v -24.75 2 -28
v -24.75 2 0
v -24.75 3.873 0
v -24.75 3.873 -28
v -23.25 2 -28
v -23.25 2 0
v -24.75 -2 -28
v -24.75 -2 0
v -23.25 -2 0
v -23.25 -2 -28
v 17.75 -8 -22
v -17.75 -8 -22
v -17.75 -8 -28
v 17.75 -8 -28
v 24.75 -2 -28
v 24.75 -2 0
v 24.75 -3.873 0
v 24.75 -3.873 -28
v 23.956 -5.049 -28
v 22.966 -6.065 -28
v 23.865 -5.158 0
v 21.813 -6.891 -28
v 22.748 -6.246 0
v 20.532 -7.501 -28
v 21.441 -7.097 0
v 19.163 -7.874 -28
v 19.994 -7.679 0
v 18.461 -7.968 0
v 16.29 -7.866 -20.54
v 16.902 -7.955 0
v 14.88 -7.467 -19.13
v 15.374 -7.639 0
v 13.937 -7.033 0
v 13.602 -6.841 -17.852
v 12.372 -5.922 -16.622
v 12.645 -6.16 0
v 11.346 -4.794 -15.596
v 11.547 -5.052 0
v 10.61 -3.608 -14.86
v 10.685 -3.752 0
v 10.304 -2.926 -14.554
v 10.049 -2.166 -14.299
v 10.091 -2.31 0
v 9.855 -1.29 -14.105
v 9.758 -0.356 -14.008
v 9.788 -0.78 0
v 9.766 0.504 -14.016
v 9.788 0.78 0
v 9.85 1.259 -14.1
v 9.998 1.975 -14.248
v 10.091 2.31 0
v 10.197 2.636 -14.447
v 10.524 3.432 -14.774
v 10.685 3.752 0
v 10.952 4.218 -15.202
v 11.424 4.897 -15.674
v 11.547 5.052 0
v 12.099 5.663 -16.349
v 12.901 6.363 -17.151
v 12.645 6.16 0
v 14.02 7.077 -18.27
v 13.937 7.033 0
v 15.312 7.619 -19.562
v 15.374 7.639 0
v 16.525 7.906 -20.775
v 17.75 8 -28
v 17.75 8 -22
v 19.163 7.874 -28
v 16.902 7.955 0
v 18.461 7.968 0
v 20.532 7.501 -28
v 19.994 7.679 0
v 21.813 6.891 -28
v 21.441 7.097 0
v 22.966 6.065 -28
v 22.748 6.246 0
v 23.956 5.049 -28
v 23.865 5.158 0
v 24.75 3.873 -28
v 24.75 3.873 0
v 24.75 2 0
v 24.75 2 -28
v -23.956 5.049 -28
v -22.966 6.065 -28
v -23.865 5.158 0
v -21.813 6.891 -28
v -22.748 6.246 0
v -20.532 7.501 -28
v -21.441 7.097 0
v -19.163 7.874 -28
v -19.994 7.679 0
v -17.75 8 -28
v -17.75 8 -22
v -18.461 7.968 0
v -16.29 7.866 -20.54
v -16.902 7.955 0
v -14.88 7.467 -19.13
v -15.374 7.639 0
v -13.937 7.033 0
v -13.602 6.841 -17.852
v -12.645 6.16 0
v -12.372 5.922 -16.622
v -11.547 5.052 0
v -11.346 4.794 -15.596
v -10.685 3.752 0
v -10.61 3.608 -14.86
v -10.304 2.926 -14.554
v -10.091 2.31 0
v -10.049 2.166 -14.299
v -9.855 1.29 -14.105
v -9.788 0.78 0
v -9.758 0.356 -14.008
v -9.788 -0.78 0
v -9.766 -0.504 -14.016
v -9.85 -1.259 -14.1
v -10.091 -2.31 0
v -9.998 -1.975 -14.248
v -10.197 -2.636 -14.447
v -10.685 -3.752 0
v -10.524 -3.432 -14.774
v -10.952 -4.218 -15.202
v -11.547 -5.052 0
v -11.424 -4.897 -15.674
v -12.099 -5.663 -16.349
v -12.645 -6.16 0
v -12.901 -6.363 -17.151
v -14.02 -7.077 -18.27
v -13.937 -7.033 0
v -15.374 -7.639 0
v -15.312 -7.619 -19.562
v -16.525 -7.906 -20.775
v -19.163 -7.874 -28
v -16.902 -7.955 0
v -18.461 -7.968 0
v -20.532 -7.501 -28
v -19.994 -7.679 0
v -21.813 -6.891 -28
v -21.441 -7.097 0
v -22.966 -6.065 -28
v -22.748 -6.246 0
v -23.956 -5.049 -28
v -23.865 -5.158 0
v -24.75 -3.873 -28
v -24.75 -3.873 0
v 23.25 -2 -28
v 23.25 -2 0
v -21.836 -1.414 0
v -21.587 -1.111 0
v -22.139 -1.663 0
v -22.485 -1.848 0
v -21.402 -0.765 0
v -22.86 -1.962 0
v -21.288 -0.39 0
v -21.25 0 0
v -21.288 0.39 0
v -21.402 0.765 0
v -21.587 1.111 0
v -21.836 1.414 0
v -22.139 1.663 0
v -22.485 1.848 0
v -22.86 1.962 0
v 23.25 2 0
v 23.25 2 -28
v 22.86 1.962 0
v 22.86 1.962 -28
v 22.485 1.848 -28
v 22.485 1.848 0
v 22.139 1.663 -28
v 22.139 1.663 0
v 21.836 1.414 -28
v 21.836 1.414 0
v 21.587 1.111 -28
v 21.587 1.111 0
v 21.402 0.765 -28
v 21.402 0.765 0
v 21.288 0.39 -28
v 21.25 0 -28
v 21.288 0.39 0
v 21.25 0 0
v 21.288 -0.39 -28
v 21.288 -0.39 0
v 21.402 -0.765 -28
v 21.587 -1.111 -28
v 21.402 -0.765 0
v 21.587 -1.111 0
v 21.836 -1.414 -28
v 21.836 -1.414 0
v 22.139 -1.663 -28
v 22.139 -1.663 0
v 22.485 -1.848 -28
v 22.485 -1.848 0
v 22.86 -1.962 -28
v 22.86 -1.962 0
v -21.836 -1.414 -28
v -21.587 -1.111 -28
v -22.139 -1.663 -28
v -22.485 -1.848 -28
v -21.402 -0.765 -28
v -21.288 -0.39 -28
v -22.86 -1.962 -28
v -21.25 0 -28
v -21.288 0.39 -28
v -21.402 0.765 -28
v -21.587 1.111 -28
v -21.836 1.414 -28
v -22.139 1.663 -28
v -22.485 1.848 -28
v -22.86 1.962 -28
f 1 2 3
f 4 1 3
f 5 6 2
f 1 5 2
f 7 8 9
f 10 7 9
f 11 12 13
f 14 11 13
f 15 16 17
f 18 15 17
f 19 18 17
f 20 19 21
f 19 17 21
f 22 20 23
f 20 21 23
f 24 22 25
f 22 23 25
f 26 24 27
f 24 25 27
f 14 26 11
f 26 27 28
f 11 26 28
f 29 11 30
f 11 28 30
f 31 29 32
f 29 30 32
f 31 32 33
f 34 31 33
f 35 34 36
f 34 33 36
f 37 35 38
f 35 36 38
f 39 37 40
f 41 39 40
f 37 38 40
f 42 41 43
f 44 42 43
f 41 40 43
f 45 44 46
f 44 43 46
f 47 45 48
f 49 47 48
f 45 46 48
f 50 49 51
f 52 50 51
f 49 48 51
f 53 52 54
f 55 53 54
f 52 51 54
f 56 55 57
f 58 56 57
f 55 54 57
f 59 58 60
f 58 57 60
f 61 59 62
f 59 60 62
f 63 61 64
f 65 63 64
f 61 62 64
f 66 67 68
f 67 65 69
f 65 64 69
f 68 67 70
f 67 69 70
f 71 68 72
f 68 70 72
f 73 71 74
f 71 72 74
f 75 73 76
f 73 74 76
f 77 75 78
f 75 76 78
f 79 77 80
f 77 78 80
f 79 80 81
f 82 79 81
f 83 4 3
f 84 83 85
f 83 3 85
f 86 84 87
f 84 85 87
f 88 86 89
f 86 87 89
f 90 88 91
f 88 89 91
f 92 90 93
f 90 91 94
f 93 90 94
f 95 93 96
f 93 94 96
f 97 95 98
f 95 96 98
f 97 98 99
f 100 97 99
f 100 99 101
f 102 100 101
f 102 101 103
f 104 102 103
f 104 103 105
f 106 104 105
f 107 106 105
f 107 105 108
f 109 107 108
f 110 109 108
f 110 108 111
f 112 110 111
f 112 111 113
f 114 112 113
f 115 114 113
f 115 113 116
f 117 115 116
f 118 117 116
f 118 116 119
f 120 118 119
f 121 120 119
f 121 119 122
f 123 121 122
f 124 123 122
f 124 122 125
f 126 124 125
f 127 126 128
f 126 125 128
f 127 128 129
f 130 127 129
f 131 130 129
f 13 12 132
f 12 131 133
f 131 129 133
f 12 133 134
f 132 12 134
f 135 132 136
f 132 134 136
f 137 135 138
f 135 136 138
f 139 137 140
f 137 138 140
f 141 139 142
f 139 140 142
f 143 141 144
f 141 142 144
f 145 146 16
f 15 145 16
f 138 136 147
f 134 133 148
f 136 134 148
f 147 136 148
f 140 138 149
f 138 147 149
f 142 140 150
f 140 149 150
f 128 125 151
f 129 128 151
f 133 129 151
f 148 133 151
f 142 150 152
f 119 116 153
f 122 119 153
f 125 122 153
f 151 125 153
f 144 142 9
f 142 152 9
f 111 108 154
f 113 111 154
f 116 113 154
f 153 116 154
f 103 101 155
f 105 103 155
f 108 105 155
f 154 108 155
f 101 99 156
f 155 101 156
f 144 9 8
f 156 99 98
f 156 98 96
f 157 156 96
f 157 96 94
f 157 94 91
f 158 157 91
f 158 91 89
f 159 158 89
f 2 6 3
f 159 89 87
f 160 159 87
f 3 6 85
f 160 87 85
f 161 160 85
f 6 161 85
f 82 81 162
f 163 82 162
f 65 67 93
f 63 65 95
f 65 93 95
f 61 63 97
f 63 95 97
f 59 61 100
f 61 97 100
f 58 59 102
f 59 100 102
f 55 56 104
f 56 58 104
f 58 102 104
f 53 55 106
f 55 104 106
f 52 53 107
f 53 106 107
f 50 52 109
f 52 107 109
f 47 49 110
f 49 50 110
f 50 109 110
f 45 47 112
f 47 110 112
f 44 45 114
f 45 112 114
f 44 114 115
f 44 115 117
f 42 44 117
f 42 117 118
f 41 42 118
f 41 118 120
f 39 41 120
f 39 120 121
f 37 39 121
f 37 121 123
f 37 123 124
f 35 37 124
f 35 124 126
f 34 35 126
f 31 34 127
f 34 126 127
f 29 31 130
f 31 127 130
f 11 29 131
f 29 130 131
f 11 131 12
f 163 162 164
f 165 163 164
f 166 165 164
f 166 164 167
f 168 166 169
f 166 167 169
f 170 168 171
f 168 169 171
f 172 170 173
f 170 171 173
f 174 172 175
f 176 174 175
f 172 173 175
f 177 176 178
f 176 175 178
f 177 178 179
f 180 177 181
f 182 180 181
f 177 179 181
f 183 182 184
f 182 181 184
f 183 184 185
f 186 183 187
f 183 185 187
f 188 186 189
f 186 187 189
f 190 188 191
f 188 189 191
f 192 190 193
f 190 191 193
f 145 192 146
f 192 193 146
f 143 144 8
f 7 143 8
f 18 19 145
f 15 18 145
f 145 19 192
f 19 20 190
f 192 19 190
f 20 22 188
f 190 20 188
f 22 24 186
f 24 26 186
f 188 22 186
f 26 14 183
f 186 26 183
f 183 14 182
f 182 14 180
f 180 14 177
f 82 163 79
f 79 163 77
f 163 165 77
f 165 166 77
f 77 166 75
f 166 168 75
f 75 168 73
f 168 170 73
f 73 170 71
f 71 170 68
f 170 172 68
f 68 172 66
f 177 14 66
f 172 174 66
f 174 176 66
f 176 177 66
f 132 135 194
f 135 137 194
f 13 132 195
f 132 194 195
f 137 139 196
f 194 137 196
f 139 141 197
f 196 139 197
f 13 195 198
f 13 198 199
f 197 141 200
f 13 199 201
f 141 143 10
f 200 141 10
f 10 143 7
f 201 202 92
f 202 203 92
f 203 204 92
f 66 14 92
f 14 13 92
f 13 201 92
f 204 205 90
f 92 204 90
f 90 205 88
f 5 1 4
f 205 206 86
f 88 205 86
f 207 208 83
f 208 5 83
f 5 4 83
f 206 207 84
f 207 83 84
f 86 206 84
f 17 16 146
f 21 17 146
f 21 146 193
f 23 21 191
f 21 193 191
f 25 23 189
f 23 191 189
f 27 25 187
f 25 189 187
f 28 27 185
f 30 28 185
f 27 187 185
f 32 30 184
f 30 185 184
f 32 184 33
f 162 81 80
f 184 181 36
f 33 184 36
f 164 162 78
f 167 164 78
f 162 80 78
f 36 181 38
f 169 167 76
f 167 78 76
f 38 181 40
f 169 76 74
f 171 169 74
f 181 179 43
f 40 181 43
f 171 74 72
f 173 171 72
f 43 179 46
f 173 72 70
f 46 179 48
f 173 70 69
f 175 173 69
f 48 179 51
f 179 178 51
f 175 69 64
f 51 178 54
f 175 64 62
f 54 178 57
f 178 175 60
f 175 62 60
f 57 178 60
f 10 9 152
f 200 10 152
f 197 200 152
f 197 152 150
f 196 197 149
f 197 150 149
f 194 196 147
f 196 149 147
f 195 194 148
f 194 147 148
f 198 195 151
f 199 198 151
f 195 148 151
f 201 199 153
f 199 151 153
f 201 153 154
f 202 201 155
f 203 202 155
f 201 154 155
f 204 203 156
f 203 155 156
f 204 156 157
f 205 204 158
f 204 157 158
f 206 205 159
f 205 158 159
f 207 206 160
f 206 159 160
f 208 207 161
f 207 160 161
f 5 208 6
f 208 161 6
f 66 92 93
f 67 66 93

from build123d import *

# Parameters (mm, degrees)
EXTRUDE_1_DEPTH   = 28
EXTRUDE_1_2_DEPTH = 28
EXTRUDE_START     = -17.75
EXTRUDE_2_DEPTH   = 35.5


with BuildPart() as part:
    # Эскиз1 → Вытянуть1 (new body)
    with BuildSketch(Plane.XY):
        with BuildLine():
            Line((-23.25, 2), (-24.75, 2))
            Line((-24.75, 2), (-24.75, 3.872983346))
            ThreePointArc((-24.75, 3.872983346), (-9.75, 0), (-24.75, -3.872983346))
            Line((-24.75, -3.872983346), (-24.75, -2))
            Line((-24.75, -2), (-23.25, -2))
            ThreePointArc((-23.25, -2), (-21.25, 0), (-23.25, 2))
        make_face()
    extrude(amount=-EXTRUDE_1_DEPTH)



with BuildPart() as body_2:
    # Эскиз1 → Extrude 1 2 (new body)
    with BuildSketch(Plane.XY):
        with BuildLine():
            Line((23.25, -2), (24.75, -2))
            Line((24.75, -2), (24.75, -3.872983346))
            ThreePointArc((24.75, -3.872983346), (9.75, 0), (24.75, 3.872983346))
            Line((24.75, 3.872983346), (24.75, 2))
            Line((24.75, 2), (23.25, 2))
            ThreePointArc((23.25, 2), (21.25, 0), (23.25, -2))
        make_face()
    extrude(amount=-EXTRUDE_1_2_DEPTH)


with BuildPart() as part_1:
    add(part.part)

    add(body_2.part)  # Вытянуть2 merges body 2
    # Эскиз2 → Вытянуть2 (add)
    with BuildSketch(Plane(origin=(0, 0, 0), x_dir=(0, 0, -1), z_dir=(1, 0, 0)).offset(EXTRUDE_START)):
        with BuildLine():
            Line((28, -8), (28, 8))
            Line((28, 8), (22, 8))
            ThreePointArc((22, 8), (14, 0), (22, -8))
            Line((22, -8), (28, -8))
        make_face()
    extrude(amount=EXTRUDE_2_DEPTH)


solid = part_1.part
